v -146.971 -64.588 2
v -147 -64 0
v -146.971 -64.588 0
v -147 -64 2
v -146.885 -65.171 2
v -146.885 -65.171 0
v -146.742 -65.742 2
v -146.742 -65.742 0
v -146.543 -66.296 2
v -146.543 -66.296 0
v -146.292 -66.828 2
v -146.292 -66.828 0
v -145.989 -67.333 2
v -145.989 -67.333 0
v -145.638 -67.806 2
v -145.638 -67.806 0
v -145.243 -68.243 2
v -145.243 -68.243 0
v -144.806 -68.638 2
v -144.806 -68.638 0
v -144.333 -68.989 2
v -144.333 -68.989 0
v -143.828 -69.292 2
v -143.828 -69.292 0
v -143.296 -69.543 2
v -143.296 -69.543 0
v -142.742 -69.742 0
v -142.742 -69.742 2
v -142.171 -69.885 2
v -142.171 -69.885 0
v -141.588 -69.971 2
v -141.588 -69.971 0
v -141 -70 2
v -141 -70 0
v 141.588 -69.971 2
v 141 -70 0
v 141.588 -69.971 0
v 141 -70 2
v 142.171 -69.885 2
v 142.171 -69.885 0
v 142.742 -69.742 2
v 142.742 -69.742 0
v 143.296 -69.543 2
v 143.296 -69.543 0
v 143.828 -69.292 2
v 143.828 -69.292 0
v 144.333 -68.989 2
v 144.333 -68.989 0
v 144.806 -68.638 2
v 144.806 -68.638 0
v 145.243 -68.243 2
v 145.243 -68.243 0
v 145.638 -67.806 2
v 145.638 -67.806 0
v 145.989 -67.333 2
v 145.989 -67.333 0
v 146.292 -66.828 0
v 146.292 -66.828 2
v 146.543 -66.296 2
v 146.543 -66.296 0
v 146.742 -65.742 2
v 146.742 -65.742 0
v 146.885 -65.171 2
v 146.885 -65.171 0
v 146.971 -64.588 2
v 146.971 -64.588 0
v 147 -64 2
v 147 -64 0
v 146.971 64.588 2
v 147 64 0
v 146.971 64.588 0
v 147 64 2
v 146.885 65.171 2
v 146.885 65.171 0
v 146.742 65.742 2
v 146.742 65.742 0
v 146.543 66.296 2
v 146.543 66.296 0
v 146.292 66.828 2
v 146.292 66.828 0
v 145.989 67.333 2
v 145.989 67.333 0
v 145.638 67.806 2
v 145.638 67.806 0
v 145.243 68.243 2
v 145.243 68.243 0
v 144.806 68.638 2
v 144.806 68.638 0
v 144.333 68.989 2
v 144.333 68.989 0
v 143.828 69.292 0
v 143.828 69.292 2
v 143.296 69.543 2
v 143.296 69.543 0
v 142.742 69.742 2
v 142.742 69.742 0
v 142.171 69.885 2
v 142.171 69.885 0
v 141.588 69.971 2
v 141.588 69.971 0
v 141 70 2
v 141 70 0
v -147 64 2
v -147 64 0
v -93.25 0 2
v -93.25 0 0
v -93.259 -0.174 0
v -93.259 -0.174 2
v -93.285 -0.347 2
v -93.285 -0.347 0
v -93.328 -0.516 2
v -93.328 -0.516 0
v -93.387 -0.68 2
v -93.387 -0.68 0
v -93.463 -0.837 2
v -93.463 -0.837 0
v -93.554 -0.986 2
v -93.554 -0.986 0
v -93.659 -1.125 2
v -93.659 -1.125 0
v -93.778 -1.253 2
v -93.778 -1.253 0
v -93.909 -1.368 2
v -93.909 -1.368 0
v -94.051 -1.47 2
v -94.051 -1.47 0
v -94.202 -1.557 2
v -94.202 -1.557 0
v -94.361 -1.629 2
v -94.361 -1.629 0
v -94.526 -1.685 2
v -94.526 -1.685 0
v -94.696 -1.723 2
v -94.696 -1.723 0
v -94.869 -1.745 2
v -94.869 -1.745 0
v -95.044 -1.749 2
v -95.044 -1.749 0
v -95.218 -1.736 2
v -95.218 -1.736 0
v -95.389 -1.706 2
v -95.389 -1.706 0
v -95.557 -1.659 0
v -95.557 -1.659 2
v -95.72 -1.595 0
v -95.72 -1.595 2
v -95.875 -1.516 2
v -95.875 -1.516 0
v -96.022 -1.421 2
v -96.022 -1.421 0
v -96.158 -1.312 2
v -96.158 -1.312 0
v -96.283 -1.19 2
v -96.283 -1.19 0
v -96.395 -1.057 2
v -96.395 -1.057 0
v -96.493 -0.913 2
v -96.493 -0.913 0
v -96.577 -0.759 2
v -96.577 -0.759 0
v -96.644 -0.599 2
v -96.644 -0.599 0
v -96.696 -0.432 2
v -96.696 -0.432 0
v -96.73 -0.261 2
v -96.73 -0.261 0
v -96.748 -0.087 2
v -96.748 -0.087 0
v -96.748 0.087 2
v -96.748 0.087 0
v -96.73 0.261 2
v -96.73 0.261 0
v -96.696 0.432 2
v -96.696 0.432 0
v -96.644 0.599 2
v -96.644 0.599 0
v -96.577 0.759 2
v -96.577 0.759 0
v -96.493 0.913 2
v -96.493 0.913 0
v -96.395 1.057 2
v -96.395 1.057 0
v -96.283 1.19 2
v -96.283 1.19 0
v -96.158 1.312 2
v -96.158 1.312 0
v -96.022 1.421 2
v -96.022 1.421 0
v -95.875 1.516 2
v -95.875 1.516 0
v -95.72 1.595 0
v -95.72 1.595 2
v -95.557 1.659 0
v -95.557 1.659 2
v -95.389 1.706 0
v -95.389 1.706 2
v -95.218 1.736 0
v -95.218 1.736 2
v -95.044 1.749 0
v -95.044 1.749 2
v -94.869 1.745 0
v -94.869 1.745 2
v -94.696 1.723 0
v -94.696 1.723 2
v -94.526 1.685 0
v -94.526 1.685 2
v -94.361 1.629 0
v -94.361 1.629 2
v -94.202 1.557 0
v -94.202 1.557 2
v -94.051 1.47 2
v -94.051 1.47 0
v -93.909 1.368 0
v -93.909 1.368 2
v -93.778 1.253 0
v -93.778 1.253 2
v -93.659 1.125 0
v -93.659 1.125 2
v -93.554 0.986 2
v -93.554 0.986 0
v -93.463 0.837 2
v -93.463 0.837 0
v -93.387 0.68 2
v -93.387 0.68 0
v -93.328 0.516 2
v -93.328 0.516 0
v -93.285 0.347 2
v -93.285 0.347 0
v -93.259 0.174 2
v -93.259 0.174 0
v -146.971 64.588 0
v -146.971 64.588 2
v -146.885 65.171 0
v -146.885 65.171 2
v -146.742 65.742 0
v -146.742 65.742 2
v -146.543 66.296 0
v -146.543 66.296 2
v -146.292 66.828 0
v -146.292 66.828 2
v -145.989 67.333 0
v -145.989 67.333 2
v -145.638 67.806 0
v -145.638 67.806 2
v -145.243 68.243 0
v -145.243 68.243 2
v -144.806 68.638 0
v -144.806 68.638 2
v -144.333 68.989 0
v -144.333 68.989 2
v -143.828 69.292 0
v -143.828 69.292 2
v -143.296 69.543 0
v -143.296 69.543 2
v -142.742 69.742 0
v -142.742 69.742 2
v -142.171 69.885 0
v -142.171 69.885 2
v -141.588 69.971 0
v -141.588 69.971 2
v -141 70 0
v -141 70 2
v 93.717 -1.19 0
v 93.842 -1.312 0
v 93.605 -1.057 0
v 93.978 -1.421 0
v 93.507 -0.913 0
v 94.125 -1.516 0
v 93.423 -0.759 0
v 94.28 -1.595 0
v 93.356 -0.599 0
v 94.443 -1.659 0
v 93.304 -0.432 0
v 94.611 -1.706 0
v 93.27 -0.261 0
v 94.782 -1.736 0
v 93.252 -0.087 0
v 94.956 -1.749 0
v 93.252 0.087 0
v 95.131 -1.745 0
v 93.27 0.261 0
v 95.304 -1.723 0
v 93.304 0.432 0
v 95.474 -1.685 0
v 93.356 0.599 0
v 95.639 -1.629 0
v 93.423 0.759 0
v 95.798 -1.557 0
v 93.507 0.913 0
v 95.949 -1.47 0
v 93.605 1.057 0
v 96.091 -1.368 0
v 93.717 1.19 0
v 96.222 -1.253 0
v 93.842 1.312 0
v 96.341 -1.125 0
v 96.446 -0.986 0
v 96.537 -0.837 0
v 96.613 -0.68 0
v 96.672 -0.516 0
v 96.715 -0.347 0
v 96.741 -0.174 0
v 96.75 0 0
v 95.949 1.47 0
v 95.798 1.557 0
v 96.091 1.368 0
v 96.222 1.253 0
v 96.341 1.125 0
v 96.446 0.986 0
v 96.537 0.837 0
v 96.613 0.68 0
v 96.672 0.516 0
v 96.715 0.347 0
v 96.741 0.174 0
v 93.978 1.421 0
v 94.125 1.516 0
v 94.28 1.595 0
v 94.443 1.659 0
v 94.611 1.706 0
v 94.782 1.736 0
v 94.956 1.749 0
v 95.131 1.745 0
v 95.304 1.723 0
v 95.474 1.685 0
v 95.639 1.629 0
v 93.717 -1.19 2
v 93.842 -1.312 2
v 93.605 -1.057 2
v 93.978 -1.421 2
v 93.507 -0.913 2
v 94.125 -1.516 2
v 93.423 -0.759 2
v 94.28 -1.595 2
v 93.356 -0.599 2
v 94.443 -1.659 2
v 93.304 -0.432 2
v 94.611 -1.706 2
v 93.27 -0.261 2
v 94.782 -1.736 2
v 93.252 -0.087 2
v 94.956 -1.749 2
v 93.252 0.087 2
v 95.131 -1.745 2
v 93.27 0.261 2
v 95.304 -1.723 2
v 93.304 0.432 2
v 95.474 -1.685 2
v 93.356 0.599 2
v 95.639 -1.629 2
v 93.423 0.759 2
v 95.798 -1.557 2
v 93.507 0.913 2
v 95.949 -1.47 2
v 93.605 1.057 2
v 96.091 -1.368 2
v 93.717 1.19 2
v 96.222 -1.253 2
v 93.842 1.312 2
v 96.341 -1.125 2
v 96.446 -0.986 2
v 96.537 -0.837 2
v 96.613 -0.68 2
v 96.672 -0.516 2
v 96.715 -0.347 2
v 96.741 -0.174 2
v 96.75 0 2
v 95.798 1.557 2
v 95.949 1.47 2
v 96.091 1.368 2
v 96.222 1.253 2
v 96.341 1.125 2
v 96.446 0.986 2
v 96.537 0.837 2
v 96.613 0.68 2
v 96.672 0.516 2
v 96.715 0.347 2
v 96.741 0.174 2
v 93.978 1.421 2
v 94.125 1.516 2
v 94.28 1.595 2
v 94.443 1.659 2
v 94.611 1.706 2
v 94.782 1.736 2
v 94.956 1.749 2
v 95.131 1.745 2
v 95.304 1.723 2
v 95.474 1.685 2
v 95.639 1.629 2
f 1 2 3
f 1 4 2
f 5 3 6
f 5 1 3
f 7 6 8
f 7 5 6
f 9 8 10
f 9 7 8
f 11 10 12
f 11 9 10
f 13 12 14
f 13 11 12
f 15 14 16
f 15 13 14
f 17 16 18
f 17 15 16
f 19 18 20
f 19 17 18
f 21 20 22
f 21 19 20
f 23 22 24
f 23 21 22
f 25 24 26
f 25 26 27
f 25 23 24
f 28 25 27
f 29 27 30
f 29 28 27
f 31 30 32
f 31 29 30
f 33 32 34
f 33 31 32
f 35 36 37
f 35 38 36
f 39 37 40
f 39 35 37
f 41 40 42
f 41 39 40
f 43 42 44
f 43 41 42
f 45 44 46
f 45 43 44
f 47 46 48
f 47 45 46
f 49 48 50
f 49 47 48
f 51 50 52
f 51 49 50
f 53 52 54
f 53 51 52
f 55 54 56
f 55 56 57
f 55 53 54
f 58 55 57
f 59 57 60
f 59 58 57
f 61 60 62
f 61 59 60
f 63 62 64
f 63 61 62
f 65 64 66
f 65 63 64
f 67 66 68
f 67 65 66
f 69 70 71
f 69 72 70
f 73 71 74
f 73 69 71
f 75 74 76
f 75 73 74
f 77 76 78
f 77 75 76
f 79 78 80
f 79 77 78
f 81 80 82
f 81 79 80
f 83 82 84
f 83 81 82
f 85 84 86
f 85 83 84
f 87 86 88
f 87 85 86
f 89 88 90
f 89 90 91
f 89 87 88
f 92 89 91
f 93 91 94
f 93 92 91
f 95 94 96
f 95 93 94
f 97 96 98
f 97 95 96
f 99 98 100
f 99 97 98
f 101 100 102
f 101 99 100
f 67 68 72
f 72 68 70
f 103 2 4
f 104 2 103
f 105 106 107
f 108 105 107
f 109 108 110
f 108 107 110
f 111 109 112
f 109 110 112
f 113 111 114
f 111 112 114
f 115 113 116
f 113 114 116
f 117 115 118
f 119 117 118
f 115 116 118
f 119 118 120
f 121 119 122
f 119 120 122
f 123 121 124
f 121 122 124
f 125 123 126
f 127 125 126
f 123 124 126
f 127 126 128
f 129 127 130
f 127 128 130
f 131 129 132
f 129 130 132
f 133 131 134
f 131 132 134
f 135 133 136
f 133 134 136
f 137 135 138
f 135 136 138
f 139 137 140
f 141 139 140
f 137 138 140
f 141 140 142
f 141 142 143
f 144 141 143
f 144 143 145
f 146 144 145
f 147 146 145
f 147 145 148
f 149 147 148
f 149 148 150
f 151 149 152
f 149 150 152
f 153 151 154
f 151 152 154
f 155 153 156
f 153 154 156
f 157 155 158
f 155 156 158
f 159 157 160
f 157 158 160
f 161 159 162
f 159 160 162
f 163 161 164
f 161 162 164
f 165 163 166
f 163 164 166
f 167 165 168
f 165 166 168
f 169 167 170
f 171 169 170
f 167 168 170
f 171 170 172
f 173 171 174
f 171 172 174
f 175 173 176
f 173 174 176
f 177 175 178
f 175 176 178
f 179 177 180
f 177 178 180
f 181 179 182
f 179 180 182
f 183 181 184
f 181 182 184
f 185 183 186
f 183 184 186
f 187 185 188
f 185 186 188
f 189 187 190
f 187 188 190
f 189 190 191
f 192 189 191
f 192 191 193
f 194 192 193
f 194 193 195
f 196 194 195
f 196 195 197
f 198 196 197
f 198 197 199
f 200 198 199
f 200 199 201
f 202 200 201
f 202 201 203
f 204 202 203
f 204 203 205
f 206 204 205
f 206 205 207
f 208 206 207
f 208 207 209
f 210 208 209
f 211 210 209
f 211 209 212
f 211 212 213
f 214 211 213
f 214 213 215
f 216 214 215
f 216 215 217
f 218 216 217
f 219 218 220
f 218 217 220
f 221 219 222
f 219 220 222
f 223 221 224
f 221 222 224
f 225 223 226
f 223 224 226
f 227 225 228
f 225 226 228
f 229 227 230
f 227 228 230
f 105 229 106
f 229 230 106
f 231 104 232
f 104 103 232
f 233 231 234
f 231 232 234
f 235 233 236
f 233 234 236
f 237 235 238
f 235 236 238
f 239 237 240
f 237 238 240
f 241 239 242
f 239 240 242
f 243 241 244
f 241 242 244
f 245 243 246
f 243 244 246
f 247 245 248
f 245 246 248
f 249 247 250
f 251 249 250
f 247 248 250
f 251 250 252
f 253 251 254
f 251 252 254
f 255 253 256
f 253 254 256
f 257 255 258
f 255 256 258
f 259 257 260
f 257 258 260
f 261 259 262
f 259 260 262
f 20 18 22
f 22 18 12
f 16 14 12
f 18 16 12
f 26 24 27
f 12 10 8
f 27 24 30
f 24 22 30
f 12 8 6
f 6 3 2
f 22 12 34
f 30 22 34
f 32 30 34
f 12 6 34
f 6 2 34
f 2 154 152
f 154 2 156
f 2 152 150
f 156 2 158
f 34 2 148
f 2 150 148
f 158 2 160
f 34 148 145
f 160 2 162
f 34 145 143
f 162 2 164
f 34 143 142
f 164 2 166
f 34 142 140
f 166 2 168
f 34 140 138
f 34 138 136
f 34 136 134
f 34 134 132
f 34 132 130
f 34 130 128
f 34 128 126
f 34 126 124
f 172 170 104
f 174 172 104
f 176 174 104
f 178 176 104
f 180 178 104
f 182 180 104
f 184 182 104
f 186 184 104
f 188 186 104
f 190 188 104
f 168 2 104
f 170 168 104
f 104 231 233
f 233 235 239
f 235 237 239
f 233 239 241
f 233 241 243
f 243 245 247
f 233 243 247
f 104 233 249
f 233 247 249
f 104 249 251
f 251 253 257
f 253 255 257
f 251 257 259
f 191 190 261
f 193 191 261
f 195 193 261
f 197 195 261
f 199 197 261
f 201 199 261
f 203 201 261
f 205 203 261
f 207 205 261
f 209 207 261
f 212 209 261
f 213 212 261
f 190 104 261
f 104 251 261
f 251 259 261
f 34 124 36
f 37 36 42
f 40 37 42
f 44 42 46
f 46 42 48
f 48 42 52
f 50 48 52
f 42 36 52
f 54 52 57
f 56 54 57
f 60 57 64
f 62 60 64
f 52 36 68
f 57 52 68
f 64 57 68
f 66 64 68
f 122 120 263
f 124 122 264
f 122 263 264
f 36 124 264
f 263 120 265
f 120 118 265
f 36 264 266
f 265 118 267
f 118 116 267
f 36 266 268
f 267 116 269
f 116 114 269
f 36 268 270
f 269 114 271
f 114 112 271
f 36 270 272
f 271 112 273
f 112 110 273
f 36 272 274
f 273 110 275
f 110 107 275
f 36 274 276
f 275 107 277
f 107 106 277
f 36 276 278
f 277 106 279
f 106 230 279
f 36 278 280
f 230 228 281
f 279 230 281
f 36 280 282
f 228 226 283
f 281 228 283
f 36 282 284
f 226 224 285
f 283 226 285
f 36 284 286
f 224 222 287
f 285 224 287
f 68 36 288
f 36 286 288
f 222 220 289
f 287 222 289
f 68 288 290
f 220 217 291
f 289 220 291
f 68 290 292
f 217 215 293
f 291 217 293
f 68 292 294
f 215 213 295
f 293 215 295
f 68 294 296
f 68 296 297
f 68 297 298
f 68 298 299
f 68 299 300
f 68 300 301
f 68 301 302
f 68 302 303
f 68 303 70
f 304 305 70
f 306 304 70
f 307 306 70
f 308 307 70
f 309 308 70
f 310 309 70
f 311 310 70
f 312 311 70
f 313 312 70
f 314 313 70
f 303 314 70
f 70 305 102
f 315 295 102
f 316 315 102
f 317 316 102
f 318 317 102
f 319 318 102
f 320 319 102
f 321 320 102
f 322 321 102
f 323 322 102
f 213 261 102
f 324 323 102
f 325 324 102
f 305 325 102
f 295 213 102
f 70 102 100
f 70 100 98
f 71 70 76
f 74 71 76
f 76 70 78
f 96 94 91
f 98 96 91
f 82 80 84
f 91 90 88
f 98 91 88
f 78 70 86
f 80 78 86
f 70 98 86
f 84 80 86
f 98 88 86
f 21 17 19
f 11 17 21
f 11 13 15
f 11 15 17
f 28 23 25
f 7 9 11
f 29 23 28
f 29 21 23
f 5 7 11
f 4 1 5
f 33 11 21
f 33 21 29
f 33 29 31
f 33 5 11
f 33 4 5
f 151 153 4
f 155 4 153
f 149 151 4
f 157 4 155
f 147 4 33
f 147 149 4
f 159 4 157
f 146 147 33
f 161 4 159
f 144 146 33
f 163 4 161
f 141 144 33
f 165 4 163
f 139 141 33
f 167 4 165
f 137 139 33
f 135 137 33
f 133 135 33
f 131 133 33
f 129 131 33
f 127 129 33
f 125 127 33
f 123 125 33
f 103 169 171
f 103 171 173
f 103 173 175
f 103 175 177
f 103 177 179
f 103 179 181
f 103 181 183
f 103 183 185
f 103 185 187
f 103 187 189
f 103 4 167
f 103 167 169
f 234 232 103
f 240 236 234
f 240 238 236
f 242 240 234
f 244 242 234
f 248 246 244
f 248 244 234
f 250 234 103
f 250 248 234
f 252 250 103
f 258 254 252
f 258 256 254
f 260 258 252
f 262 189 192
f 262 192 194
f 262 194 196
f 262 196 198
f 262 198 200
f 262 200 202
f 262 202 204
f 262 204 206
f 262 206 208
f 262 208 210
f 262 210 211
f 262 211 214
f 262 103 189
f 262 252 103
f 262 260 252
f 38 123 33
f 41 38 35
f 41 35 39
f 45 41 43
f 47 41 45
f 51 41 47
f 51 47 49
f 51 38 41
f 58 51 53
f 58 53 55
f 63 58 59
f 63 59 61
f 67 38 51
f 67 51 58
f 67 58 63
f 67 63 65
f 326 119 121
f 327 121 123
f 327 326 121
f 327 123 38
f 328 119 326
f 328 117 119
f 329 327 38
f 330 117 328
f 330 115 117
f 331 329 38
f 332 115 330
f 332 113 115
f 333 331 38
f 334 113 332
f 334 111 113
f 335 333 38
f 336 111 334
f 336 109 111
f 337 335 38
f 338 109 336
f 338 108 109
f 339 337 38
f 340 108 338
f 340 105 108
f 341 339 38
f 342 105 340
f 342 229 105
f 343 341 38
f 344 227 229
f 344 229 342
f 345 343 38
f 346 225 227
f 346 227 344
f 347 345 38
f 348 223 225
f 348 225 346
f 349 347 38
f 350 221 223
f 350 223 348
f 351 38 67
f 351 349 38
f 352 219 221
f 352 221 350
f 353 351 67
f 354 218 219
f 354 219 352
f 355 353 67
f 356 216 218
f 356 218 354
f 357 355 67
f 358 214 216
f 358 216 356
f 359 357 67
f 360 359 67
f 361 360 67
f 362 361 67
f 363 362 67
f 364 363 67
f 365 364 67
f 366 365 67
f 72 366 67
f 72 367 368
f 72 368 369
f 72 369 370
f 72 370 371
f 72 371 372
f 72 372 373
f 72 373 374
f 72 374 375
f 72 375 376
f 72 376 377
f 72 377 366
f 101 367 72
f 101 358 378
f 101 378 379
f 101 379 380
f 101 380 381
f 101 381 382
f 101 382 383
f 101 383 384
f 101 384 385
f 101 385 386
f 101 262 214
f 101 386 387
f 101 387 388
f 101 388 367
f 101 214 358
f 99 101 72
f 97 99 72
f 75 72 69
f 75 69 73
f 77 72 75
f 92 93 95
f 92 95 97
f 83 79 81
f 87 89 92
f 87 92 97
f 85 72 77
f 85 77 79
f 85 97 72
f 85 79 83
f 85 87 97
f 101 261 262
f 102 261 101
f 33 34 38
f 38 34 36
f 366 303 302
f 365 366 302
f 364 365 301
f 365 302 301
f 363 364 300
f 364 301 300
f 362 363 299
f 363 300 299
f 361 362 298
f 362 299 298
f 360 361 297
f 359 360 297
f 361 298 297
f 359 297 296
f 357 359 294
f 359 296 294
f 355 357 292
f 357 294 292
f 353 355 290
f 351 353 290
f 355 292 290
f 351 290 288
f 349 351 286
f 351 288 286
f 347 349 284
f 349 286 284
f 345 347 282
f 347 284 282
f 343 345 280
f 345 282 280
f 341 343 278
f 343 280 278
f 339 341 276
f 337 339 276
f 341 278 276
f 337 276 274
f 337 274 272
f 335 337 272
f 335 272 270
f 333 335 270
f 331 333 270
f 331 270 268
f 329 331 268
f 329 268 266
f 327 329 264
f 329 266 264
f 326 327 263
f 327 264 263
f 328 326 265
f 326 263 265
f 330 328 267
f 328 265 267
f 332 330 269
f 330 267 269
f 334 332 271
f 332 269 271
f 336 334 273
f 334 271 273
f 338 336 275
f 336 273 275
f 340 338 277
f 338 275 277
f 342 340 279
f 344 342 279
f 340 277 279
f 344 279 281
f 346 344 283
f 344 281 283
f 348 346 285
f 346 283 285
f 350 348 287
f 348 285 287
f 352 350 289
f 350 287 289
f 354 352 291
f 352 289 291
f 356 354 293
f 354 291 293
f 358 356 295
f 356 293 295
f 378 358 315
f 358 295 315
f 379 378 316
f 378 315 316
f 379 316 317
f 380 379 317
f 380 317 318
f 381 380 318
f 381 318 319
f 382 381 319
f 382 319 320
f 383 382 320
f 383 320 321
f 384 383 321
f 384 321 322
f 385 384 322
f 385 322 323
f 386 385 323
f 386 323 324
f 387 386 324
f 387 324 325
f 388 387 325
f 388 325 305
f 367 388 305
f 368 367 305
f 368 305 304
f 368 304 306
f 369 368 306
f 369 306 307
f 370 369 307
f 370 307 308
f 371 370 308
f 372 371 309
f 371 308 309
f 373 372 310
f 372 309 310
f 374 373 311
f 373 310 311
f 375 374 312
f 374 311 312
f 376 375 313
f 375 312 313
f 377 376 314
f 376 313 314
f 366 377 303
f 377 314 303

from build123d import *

# Parameters (mm, degrees)
F0_W     = 294
F0_H     = 140
F1_DEPTH = 2
F2_R     = 6
F3_R     = 1.75
F4_DEPTH = 2


with BuildPart() as f1:
    # F0 (on Top) → F1 (new body)
    with BuildSketch(Plane.XY):
        Rectangle(F0_W, F0_H)
    extrude(amount=F1_DEPTH)

    # F2
    f2_edges = [f1.edges().sort_by_distance(p)[0] for p in [
        (147, -70, 1),
        (147, 70, 1),
        (-147, -70, 1),
        (-147, 70, 1),
    ]]
    fillet(f2_edges, radius=F2_R)

    # F3 (on face) → F4 (cut, through all)
    with BuildSketch(Plane(origin=(0, 0, 0), x_dir=(1, 0, 0), z_dir=(0, 0, -1))):
        with Locations((-95, 0)):
            Circle(F3_R)
        with Locations((95, 0)):
            Circle(F3_R)
    extrude(amount=-F4_DEPTH, mode=Mode.SUBTRACT)


solid = f1.part
